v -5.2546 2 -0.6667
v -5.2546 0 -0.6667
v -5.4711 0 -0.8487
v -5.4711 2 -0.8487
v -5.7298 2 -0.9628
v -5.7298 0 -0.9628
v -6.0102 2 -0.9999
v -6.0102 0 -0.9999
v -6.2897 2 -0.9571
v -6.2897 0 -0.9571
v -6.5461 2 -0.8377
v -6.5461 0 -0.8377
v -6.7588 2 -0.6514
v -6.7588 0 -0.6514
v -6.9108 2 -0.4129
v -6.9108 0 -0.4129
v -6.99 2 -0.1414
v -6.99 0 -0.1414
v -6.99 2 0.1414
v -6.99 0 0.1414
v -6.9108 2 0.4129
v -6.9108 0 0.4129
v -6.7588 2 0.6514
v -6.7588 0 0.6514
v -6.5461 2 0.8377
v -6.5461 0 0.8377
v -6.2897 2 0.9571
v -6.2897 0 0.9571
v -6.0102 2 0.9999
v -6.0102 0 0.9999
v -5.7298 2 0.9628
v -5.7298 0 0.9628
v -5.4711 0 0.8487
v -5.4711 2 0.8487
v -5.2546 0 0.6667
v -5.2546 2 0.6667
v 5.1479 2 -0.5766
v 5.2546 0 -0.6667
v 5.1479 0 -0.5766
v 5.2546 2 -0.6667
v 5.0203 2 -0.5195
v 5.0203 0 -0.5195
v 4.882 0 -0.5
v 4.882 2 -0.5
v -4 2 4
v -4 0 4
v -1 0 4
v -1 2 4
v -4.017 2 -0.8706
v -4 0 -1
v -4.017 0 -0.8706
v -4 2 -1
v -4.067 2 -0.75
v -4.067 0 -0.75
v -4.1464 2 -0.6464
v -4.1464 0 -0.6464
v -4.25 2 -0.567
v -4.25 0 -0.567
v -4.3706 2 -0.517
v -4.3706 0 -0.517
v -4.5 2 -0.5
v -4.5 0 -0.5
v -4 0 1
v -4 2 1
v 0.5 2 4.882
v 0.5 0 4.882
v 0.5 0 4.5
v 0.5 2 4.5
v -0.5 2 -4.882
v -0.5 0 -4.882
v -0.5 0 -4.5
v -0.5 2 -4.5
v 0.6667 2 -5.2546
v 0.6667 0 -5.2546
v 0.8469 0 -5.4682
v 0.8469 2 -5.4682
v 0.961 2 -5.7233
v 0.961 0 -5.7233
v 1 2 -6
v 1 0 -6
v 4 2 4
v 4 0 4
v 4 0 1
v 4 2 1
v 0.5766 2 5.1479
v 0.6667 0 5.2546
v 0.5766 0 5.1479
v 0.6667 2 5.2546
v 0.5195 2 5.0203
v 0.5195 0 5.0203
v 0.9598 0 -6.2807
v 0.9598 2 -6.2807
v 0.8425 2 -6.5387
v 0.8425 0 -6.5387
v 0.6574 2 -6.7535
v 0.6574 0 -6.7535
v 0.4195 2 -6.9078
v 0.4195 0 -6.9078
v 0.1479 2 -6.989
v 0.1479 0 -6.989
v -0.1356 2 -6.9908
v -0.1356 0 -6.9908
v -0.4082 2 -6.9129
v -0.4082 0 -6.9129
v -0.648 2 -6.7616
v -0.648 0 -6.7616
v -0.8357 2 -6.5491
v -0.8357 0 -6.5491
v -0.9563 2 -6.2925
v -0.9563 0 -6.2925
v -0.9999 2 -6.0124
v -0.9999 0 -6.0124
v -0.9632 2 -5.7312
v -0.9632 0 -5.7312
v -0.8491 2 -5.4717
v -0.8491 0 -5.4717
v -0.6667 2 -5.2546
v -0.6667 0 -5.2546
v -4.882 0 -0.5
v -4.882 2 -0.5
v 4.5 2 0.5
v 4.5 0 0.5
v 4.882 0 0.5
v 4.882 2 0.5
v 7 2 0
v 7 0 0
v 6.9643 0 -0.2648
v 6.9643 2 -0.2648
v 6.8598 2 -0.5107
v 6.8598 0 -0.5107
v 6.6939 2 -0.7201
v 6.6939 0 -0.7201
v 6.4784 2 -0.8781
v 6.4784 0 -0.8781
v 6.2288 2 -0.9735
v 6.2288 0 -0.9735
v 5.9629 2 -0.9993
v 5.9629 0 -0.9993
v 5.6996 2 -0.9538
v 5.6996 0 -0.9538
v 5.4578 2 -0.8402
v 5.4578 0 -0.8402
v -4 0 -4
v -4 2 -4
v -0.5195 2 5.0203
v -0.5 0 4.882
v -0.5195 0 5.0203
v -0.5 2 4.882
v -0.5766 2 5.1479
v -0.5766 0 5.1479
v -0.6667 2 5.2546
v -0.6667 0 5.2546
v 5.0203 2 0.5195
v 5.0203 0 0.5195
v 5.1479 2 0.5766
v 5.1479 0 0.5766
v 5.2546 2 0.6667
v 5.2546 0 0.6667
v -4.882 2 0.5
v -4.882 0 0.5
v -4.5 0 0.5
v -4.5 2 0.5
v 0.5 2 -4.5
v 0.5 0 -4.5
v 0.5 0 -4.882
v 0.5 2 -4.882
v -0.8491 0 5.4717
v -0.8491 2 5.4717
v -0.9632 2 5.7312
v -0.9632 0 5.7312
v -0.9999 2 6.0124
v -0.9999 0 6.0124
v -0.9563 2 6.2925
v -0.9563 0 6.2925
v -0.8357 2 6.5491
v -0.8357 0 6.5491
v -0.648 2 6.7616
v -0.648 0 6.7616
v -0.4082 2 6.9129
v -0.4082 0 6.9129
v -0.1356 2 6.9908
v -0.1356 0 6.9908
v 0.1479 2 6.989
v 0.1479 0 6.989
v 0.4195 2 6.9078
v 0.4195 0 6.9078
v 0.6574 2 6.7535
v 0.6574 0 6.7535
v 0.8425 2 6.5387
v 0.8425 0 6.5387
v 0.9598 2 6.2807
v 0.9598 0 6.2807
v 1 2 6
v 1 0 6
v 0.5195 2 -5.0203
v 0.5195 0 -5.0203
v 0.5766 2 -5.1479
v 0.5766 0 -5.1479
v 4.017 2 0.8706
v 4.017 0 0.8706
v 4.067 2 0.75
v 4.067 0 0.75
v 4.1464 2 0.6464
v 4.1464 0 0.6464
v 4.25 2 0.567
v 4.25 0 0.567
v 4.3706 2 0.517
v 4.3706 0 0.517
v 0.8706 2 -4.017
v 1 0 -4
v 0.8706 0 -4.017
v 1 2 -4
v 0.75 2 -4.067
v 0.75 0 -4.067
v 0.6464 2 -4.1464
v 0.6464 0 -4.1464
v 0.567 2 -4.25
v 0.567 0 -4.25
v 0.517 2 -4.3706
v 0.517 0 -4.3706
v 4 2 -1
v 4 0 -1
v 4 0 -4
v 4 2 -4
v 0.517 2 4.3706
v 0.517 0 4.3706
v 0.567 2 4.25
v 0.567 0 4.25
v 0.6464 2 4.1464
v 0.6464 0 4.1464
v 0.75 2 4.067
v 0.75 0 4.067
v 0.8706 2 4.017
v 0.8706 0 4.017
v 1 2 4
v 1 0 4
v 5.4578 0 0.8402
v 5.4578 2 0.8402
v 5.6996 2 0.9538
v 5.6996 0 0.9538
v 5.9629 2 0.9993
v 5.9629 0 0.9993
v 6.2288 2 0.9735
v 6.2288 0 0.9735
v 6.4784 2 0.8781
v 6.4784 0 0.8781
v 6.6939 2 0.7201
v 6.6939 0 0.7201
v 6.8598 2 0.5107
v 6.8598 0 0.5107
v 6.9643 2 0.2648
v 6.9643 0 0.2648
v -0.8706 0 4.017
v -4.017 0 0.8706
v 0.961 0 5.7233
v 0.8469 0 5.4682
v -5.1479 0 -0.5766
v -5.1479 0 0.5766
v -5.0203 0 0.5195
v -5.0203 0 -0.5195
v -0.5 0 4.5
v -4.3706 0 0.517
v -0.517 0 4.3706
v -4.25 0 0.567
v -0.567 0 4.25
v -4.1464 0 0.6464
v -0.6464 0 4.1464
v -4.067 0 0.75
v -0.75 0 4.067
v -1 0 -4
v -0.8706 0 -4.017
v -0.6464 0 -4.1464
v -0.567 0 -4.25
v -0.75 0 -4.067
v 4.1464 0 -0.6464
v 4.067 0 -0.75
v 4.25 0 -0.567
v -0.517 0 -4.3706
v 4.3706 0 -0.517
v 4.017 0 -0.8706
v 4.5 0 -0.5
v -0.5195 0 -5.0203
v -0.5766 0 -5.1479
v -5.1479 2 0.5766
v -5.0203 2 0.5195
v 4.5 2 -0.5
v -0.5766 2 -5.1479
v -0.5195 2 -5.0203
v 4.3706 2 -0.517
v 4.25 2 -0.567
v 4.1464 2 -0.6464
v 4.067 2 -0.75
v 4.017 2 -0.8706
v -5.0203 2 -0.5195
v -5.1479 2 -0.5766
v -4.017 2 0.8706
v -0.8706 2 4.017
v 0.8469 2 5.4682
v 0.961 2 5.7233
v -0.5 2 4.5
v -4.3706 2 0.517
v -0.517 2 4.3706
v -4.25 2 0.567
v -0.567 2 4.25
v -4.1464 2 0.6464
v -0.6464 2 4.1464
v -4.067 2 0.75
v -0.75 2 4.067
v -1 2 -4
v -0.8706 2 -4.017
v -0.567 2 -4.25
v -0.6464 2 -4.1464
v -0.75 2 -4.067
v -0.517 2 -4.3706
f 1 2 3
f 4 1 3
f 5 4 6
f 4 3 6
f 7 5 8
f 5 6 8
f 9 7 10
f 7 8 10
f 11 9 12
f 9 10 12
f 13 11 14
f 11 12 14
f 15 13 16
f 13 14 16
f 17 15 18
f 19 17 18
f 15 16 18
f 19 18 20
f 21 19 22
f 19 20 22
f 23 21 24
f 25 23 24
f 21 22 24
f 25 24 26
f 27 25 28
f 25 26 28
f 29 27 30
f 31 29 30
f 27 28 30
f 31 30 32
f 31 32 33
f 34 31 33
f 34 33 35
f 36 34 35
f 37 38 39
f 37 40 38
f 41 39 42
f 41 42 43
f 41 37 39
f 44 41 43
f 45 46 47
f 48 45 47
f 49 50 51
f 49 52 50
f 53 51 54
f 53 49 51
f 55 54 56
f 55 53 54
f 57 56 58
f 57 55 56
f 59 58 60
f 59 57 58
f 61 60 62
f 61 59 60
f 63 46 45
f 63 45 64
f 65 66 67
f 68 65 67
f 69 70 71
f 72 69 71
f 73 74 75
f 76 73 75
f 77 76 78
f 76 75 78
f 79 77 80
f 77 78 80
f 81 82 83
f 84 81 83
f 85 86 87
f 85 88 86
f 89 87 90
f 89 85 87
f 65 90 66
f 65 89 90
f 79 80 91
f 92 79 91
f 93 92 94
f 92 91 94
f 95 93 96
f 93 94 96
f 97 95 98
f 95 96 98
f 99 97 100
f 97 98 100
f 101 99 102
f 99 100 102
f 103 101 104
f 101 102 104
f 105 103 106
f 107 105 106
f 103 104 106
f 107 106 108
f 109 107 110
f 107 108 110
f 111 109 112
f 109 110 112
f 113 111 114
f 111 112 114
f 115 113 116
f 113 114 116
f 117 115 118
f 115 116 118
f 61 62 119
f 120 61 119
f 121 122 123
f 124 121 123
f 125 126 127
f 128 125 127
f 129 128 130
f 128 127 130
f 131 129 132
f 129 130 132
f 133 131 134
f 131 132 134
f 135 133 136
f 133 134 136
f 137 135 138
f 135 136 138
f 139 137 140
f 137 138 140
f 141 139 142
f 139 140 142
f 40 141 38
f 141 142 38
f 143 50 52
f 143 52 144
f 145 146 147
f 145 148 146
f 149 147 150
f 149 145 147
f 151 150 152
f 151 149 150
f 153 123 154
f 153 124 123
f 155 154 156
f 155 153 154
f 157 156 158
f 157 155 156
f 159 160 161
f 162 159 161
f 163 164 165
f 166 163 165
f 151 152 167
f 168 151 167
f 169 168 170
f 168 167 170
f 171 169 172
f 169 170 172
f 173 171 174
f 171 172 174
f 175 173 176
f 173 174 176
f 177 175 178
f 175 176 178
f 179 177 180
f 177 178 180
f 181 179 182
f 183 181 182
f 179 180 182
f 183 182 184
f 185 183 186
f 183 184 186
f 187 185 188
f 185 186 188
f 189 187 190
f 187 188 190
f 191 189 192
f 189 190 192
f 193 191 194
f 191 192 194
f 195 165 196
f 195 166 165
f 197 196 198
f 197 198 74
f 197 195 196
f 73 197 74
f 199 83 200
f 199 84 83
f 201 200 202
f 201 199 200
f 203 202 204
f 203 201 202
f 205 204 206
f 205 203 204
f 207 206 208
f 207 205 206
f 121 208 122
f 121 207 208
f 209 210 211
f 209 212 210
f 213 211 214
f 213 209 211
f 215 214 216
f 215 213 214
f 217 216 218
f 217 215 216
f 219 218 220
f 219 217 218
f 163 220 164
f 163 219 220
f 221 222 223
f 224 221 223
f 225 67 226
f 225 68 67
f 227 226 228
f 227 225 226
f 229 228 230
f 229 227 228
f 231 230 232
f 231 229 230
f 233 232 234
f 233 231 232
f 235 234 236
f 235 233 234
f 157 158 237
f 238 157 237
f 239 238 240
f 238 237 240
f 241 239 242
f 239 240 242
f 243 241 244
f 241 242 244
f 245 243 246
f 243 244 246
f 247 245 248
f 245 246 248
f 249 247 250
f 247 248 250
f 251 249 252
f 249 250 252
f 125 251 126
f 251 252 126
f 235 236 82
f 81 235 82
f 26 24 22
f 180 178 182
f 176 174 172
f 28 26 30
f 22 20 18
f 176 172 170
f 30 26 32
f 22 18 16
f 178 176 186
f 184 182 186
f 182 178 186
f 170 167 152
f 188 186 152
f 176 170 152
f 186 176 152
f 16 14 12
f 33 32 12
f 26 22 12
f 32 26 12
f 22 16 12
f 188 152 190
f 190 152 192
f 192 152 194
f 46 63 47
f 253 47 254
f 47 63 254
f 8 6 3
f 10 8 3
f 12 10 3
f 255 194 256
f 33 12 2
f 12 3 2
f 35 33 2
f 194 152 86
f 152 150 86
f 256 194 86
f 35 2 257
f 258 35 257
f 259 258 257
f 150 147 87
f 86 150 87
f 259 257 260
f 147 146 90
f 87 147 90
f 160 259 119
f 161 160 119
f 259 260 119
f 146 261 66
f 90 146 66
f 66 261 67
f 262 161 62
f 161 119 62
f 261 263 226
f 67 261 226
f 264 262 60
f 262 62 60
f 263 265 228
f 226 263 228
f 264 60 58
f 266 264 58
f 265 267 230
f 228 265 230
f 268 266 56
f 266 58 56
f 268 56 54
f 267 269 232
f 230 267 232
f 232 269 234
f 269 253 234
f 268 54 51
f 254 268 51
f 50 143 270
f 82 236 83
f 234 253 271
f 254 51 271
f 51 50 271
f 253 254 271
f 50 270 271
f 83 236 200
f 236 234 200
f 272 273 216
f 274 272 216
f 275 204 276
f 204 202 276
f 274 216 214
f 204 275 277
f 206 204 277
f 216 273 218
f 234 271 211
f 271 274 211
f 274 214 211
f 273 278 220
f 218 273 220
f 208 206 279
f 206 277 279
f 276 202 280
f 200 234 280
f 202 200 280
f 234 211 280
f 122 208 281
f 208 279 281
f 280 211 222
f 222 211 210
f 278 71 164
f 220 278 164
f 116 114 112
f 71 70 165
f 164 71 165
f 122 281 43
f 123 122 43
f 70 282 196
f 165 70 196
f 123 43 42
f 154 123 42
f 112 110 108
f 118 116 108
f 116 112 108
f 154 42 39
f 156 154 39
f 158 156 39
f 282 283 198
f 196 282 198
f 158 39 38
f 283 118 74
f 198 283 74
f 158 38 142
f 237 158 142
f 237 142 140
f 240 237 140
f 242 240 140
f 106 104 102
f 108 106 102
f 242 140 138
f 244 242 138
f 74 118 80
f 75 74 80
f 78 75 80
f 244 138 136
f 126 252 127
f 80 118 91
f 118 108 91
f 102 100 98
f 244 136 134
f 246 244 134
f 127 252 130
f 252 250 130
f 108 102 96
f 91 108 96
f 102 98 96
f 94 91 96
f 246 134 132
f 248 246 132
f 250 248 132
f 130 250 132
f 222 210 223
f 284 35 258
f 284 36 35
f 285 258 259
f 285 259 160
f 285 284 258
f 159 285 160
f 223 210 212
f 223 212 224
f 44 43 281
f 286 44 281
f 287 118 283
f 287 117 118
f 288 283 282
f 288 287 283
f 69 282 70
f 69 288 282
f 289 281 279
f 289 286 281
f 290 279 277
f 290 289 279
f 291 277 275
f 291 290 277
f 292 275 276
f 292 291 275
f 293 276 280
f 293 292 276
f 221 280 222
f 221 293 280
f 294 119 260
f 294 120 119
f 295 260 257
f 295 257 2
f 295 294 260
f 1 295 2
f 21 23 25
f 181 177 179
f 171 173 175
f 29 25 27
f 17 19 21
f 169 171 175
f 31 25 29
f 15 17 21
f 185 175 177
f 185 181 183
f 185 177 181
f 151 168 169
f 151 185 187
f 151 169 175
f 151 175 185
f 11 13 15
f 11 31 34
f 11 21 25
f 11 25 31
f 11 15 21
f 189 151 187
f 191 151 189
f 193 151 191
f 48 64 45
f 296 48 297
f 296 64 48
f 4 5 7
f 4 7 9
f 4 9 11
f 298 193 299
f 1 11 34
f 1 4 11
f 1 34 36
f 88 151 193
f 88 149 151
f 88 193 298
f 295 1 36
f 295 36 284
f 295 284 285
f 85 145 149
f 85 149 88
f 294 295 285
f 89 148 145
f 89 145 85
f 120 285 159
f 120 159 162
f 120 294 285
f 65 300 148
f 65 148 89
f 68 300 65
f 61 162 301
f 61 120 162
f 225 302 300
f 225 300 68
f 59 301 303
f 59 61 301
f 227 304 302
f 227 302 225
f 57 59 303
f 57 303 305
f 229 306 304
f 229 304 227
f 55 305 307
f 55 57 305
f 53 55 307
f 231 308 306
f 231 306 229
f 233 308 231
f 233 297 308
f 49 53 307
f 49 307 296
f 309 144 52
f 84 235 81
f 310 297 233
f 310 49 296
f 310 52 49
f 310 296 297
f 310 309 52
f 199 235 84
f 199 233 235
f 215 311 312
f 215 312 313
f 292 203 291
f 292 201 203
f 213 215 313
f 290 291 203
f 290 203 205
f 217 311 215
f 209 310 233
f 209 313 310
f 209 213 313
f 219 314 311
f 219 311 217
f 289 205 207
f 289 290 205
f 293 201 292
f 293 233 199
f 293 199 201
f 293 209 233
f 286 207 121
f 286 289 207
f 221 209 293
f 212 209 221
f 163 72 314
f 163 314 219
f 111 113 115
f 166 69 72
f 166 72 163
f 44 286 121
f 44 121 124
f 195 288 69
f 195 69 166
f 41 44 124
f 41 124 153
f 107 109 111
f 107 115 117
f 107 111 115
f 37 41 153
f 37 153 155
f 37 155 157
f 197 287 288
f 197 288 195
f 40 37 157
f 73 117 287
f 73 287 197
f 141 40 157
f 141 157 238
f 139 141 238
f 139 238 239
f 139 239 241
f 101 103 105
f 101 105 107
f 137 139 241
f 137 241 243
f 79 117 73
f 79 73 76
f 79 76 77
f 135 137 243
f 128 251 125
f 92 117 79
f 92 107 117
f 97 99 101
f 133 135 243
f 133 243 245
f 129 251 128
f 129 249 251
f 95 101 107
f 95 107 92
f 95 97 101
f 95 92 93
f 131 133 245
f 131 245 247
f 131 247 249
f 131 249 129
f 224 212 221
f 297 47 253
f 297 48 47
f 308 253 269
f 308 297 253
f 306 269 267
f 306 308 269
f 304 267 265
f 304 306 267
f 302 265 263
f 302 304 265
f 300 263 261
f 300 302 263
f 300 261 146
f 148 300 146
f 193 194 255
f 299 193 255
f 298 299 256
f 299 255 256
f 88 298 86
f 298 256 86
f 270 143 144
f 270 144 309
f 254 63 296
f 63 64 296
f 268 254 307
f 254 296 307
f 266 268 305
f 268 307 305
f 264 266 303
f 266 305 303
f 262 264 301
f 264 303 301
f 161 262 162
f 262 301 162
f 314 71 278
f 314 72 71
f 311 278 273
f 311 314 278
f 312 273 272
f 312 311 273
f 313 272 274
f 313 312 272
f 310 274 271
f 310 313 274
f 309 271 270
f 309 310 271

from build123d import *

# Parameters (mm, degrees)
SKETCH1_W           = 8
SKETCH1_H           = 8
BOSS_EXTRUDE1_DEPTH = 2
FILLET2_R           = 0.5


with BuildPart() as part:
    # Sketch1 → Boss-Extrude1 (new body)
    with BuildSketch(Plane(origin=(0, 0, 0), x_dir=(1, 0, 0), z_dir=(0, 1, 0))):
        Rectangle(SKETCH1_W, SKETCH1_H)
        with BuildLine():
            ThreePointArc((-5, 0), (-5.034074174, 0.258819045), (-5.133974596, 0.5))
            Line((-5.133974596, 0.5), (-6, 0.5))
            Line((-6, 0.5), (-6, -0.5))
            Line((-6, -0.5), (-5.133974596, -0.5))
            ThreePointArc((-5.133974596, -0.5), (-5.034074174, -0.258819045), (-5, 0))
        make_face()
        with BuildLine():
            Line((-6, 0.5), (-5.133974596, 0.5))
            ThreePointArc((-5.133974596, 0.5), (-7, 0), (-5.133974596, -0.5))
            Line((-5.133974596, -0.5), (-6, -0.5))
            Line((-6, -0.5), (-6, 0.5))
        make_face()
        with BuildLine():
            Line((-4, -0.5), (-4, 0.5))
            Line((-4, 0.5), (-5.133974596, 0.5))
            ThreePointArc((-5.133974596, 0.5), (-5.034074174, 0.258819045), (-5, 0))
            ThreePointArc((-5, 0), (-5.034074174, -0.258819045), (-5.133974596, -0.5))
            Line((-5.133974596, -0.5), (-4, -0.5))
        make_face()
        with BuildLine():
            Line((0, 5), (0, 4))
            Line((0, 4), (0.5, 4))
            Line((0.5, 4), (0.5, 5.133974596))
            ThreePointArc((0.5, 5.133974596), (0.258819045, 5.034074174), (0, 5))
        make_face()
        with BuildLine():
            Line((-0.5, 5.133974596), (-0.5, 4))
            Line((-0.5, 4), (0, 4))
            Line((0, 4), (0, 5))
            ThreePointArc((0, 5), (-0.258819045, 5.034074174), (-0.5, 5.133974596))
        make_face()
        with BuildLine():
            Line((-0.5, 6), (-0.5, 5.133974596))
            ThreePointArc((-0.5, 5.133974596), (-0.258819045, 5.034074174), (0, 5))
            Line((0, 5), (0, 6))
            Line((0, 6), (-0.5, 6))
        make_face()
        with BuildLine():
            Line((0, 6), (0, 5))
            ThreePointArc((0, 5), (0.258819045, 5.034074174), (0.5, 5.133974596))
            Line((0.5, 5.133974596), (0.5, 6))
            Line((0.5, 6), (0, 6))
        make_face()
        with BuildLine():
            ThreePointArc((1, 6), (-0.5, 6.866025404), (-0.5, 5.133974596))
            Line((-0.5, 5.133974596), (-0.5, 6))
            Line((-0.5, 6), (0, 6))
            Line((0, 6), (0.5, 6))
            Line((0.5, 6), (0.5, 5.133974596))
            ThreePointArc((0.5, 5.133974596), (0.866025404, 5.5), (1, 6))
        make_face()
        with BuildLine():
            ThreePointArc((7, 0), (6.258819045, 0.965925826), (5.133974596, 0.5))
            Line((5.133974596, 0.5), (6, 0.5))
            Line((6, 0.5), (6, -0.5))
            Line((6, -0.5), (5.133974596, -0.5))
            ThreePointArc((5.133974596, -0.5), (6.258819045, -0.965925826), (7, 0))
        make_face()
        with BuildLine():
            Line((6, 0.5), (5.133974596, 0.5))
            ThreePointArc((5.133974596, 0.5), (5, 0), (5.133974596, -0.5))
            Line((5.133974596, -0.5), (6, -0.5))
            Line((6, -0.5), (6, 0.5))
        make_face()
        with BuildLine():
            ThreePointArc((0.5, -5.133974596), (0, -5), (-0.5, -5.133974596))
            Line((-0.5, -5.133974596), (-0.5, -6))
            Line((-0.5, -6), (0.5, -6))
            Line((0.5, -6), (0.5, -5.133974596))
        make_face()
        with BuildLine():
            Line((-0.5, -6), (-0.5, -5.133974596))
            ThreePointArc((-0.5, -5.133974596), (-0.5, -6.866025404), (1, -6))
            ThreePointArc((1, -6), (0.866025404, -5.5), (0.5, -5.133974596))
            Line((0.5, -5.133974596), (0.5, -6))
            Line((0.5, -6), (-0.5, -6))
        make_face()
        with BuildLine():
            Line((0.5, -4), (-0.5, -4))
            Line((-0.5, -4), (-0.5, -5.133974596))
            ThreePointArc((-0.5, -5.133974596), (0, -5), (0.5, -5.133974596))
            Line((0.5, -5.133974596), (0.5, -4))
        make_face()
        with BuildLine():
            Line((5.133974596, 0.5), (4, 0.5))
            Line((4, 0.5), (4, -0.5))
            Line((4, -0.5), (5.133974596, -0.5))
            ThreePointArc((5.133974596, -0.5), (5, 0), (5.133974596, 0.5))
        make_face()
    extrude(amount=BOSS_EXTRUDE1_DEPTH)

    # Fillet2
    fillet2_edges = [part.edges().sort_by_distance(p)[0] for p in [
        (0.5, 1, -4),
        (4, 1, -0.5),
        (5.133974596, 1, -0.5),
        (5.133974596, 1, 0.5),
        (4, 1, 0.5),
        (0.5, 1, 4),
        (0.5, 1, 5.133974596),
        (-0.5, 1, 5.133974596),
        (-0.5, 1, 4),
        (-4, 1, 0.5),
        (-5.133974596, 1, 0.5),
        (-5.133974596, 1, -0.5),
        (-4, 1, -0.5),
        (-0.5, 1, -4),
        (-0.5, 1, -5.133974596),
        (0.5, 1, -5.133974596),
    ]]
    fillet(fillet2_edges, radius=FILLET2_R)


solid = part.part
